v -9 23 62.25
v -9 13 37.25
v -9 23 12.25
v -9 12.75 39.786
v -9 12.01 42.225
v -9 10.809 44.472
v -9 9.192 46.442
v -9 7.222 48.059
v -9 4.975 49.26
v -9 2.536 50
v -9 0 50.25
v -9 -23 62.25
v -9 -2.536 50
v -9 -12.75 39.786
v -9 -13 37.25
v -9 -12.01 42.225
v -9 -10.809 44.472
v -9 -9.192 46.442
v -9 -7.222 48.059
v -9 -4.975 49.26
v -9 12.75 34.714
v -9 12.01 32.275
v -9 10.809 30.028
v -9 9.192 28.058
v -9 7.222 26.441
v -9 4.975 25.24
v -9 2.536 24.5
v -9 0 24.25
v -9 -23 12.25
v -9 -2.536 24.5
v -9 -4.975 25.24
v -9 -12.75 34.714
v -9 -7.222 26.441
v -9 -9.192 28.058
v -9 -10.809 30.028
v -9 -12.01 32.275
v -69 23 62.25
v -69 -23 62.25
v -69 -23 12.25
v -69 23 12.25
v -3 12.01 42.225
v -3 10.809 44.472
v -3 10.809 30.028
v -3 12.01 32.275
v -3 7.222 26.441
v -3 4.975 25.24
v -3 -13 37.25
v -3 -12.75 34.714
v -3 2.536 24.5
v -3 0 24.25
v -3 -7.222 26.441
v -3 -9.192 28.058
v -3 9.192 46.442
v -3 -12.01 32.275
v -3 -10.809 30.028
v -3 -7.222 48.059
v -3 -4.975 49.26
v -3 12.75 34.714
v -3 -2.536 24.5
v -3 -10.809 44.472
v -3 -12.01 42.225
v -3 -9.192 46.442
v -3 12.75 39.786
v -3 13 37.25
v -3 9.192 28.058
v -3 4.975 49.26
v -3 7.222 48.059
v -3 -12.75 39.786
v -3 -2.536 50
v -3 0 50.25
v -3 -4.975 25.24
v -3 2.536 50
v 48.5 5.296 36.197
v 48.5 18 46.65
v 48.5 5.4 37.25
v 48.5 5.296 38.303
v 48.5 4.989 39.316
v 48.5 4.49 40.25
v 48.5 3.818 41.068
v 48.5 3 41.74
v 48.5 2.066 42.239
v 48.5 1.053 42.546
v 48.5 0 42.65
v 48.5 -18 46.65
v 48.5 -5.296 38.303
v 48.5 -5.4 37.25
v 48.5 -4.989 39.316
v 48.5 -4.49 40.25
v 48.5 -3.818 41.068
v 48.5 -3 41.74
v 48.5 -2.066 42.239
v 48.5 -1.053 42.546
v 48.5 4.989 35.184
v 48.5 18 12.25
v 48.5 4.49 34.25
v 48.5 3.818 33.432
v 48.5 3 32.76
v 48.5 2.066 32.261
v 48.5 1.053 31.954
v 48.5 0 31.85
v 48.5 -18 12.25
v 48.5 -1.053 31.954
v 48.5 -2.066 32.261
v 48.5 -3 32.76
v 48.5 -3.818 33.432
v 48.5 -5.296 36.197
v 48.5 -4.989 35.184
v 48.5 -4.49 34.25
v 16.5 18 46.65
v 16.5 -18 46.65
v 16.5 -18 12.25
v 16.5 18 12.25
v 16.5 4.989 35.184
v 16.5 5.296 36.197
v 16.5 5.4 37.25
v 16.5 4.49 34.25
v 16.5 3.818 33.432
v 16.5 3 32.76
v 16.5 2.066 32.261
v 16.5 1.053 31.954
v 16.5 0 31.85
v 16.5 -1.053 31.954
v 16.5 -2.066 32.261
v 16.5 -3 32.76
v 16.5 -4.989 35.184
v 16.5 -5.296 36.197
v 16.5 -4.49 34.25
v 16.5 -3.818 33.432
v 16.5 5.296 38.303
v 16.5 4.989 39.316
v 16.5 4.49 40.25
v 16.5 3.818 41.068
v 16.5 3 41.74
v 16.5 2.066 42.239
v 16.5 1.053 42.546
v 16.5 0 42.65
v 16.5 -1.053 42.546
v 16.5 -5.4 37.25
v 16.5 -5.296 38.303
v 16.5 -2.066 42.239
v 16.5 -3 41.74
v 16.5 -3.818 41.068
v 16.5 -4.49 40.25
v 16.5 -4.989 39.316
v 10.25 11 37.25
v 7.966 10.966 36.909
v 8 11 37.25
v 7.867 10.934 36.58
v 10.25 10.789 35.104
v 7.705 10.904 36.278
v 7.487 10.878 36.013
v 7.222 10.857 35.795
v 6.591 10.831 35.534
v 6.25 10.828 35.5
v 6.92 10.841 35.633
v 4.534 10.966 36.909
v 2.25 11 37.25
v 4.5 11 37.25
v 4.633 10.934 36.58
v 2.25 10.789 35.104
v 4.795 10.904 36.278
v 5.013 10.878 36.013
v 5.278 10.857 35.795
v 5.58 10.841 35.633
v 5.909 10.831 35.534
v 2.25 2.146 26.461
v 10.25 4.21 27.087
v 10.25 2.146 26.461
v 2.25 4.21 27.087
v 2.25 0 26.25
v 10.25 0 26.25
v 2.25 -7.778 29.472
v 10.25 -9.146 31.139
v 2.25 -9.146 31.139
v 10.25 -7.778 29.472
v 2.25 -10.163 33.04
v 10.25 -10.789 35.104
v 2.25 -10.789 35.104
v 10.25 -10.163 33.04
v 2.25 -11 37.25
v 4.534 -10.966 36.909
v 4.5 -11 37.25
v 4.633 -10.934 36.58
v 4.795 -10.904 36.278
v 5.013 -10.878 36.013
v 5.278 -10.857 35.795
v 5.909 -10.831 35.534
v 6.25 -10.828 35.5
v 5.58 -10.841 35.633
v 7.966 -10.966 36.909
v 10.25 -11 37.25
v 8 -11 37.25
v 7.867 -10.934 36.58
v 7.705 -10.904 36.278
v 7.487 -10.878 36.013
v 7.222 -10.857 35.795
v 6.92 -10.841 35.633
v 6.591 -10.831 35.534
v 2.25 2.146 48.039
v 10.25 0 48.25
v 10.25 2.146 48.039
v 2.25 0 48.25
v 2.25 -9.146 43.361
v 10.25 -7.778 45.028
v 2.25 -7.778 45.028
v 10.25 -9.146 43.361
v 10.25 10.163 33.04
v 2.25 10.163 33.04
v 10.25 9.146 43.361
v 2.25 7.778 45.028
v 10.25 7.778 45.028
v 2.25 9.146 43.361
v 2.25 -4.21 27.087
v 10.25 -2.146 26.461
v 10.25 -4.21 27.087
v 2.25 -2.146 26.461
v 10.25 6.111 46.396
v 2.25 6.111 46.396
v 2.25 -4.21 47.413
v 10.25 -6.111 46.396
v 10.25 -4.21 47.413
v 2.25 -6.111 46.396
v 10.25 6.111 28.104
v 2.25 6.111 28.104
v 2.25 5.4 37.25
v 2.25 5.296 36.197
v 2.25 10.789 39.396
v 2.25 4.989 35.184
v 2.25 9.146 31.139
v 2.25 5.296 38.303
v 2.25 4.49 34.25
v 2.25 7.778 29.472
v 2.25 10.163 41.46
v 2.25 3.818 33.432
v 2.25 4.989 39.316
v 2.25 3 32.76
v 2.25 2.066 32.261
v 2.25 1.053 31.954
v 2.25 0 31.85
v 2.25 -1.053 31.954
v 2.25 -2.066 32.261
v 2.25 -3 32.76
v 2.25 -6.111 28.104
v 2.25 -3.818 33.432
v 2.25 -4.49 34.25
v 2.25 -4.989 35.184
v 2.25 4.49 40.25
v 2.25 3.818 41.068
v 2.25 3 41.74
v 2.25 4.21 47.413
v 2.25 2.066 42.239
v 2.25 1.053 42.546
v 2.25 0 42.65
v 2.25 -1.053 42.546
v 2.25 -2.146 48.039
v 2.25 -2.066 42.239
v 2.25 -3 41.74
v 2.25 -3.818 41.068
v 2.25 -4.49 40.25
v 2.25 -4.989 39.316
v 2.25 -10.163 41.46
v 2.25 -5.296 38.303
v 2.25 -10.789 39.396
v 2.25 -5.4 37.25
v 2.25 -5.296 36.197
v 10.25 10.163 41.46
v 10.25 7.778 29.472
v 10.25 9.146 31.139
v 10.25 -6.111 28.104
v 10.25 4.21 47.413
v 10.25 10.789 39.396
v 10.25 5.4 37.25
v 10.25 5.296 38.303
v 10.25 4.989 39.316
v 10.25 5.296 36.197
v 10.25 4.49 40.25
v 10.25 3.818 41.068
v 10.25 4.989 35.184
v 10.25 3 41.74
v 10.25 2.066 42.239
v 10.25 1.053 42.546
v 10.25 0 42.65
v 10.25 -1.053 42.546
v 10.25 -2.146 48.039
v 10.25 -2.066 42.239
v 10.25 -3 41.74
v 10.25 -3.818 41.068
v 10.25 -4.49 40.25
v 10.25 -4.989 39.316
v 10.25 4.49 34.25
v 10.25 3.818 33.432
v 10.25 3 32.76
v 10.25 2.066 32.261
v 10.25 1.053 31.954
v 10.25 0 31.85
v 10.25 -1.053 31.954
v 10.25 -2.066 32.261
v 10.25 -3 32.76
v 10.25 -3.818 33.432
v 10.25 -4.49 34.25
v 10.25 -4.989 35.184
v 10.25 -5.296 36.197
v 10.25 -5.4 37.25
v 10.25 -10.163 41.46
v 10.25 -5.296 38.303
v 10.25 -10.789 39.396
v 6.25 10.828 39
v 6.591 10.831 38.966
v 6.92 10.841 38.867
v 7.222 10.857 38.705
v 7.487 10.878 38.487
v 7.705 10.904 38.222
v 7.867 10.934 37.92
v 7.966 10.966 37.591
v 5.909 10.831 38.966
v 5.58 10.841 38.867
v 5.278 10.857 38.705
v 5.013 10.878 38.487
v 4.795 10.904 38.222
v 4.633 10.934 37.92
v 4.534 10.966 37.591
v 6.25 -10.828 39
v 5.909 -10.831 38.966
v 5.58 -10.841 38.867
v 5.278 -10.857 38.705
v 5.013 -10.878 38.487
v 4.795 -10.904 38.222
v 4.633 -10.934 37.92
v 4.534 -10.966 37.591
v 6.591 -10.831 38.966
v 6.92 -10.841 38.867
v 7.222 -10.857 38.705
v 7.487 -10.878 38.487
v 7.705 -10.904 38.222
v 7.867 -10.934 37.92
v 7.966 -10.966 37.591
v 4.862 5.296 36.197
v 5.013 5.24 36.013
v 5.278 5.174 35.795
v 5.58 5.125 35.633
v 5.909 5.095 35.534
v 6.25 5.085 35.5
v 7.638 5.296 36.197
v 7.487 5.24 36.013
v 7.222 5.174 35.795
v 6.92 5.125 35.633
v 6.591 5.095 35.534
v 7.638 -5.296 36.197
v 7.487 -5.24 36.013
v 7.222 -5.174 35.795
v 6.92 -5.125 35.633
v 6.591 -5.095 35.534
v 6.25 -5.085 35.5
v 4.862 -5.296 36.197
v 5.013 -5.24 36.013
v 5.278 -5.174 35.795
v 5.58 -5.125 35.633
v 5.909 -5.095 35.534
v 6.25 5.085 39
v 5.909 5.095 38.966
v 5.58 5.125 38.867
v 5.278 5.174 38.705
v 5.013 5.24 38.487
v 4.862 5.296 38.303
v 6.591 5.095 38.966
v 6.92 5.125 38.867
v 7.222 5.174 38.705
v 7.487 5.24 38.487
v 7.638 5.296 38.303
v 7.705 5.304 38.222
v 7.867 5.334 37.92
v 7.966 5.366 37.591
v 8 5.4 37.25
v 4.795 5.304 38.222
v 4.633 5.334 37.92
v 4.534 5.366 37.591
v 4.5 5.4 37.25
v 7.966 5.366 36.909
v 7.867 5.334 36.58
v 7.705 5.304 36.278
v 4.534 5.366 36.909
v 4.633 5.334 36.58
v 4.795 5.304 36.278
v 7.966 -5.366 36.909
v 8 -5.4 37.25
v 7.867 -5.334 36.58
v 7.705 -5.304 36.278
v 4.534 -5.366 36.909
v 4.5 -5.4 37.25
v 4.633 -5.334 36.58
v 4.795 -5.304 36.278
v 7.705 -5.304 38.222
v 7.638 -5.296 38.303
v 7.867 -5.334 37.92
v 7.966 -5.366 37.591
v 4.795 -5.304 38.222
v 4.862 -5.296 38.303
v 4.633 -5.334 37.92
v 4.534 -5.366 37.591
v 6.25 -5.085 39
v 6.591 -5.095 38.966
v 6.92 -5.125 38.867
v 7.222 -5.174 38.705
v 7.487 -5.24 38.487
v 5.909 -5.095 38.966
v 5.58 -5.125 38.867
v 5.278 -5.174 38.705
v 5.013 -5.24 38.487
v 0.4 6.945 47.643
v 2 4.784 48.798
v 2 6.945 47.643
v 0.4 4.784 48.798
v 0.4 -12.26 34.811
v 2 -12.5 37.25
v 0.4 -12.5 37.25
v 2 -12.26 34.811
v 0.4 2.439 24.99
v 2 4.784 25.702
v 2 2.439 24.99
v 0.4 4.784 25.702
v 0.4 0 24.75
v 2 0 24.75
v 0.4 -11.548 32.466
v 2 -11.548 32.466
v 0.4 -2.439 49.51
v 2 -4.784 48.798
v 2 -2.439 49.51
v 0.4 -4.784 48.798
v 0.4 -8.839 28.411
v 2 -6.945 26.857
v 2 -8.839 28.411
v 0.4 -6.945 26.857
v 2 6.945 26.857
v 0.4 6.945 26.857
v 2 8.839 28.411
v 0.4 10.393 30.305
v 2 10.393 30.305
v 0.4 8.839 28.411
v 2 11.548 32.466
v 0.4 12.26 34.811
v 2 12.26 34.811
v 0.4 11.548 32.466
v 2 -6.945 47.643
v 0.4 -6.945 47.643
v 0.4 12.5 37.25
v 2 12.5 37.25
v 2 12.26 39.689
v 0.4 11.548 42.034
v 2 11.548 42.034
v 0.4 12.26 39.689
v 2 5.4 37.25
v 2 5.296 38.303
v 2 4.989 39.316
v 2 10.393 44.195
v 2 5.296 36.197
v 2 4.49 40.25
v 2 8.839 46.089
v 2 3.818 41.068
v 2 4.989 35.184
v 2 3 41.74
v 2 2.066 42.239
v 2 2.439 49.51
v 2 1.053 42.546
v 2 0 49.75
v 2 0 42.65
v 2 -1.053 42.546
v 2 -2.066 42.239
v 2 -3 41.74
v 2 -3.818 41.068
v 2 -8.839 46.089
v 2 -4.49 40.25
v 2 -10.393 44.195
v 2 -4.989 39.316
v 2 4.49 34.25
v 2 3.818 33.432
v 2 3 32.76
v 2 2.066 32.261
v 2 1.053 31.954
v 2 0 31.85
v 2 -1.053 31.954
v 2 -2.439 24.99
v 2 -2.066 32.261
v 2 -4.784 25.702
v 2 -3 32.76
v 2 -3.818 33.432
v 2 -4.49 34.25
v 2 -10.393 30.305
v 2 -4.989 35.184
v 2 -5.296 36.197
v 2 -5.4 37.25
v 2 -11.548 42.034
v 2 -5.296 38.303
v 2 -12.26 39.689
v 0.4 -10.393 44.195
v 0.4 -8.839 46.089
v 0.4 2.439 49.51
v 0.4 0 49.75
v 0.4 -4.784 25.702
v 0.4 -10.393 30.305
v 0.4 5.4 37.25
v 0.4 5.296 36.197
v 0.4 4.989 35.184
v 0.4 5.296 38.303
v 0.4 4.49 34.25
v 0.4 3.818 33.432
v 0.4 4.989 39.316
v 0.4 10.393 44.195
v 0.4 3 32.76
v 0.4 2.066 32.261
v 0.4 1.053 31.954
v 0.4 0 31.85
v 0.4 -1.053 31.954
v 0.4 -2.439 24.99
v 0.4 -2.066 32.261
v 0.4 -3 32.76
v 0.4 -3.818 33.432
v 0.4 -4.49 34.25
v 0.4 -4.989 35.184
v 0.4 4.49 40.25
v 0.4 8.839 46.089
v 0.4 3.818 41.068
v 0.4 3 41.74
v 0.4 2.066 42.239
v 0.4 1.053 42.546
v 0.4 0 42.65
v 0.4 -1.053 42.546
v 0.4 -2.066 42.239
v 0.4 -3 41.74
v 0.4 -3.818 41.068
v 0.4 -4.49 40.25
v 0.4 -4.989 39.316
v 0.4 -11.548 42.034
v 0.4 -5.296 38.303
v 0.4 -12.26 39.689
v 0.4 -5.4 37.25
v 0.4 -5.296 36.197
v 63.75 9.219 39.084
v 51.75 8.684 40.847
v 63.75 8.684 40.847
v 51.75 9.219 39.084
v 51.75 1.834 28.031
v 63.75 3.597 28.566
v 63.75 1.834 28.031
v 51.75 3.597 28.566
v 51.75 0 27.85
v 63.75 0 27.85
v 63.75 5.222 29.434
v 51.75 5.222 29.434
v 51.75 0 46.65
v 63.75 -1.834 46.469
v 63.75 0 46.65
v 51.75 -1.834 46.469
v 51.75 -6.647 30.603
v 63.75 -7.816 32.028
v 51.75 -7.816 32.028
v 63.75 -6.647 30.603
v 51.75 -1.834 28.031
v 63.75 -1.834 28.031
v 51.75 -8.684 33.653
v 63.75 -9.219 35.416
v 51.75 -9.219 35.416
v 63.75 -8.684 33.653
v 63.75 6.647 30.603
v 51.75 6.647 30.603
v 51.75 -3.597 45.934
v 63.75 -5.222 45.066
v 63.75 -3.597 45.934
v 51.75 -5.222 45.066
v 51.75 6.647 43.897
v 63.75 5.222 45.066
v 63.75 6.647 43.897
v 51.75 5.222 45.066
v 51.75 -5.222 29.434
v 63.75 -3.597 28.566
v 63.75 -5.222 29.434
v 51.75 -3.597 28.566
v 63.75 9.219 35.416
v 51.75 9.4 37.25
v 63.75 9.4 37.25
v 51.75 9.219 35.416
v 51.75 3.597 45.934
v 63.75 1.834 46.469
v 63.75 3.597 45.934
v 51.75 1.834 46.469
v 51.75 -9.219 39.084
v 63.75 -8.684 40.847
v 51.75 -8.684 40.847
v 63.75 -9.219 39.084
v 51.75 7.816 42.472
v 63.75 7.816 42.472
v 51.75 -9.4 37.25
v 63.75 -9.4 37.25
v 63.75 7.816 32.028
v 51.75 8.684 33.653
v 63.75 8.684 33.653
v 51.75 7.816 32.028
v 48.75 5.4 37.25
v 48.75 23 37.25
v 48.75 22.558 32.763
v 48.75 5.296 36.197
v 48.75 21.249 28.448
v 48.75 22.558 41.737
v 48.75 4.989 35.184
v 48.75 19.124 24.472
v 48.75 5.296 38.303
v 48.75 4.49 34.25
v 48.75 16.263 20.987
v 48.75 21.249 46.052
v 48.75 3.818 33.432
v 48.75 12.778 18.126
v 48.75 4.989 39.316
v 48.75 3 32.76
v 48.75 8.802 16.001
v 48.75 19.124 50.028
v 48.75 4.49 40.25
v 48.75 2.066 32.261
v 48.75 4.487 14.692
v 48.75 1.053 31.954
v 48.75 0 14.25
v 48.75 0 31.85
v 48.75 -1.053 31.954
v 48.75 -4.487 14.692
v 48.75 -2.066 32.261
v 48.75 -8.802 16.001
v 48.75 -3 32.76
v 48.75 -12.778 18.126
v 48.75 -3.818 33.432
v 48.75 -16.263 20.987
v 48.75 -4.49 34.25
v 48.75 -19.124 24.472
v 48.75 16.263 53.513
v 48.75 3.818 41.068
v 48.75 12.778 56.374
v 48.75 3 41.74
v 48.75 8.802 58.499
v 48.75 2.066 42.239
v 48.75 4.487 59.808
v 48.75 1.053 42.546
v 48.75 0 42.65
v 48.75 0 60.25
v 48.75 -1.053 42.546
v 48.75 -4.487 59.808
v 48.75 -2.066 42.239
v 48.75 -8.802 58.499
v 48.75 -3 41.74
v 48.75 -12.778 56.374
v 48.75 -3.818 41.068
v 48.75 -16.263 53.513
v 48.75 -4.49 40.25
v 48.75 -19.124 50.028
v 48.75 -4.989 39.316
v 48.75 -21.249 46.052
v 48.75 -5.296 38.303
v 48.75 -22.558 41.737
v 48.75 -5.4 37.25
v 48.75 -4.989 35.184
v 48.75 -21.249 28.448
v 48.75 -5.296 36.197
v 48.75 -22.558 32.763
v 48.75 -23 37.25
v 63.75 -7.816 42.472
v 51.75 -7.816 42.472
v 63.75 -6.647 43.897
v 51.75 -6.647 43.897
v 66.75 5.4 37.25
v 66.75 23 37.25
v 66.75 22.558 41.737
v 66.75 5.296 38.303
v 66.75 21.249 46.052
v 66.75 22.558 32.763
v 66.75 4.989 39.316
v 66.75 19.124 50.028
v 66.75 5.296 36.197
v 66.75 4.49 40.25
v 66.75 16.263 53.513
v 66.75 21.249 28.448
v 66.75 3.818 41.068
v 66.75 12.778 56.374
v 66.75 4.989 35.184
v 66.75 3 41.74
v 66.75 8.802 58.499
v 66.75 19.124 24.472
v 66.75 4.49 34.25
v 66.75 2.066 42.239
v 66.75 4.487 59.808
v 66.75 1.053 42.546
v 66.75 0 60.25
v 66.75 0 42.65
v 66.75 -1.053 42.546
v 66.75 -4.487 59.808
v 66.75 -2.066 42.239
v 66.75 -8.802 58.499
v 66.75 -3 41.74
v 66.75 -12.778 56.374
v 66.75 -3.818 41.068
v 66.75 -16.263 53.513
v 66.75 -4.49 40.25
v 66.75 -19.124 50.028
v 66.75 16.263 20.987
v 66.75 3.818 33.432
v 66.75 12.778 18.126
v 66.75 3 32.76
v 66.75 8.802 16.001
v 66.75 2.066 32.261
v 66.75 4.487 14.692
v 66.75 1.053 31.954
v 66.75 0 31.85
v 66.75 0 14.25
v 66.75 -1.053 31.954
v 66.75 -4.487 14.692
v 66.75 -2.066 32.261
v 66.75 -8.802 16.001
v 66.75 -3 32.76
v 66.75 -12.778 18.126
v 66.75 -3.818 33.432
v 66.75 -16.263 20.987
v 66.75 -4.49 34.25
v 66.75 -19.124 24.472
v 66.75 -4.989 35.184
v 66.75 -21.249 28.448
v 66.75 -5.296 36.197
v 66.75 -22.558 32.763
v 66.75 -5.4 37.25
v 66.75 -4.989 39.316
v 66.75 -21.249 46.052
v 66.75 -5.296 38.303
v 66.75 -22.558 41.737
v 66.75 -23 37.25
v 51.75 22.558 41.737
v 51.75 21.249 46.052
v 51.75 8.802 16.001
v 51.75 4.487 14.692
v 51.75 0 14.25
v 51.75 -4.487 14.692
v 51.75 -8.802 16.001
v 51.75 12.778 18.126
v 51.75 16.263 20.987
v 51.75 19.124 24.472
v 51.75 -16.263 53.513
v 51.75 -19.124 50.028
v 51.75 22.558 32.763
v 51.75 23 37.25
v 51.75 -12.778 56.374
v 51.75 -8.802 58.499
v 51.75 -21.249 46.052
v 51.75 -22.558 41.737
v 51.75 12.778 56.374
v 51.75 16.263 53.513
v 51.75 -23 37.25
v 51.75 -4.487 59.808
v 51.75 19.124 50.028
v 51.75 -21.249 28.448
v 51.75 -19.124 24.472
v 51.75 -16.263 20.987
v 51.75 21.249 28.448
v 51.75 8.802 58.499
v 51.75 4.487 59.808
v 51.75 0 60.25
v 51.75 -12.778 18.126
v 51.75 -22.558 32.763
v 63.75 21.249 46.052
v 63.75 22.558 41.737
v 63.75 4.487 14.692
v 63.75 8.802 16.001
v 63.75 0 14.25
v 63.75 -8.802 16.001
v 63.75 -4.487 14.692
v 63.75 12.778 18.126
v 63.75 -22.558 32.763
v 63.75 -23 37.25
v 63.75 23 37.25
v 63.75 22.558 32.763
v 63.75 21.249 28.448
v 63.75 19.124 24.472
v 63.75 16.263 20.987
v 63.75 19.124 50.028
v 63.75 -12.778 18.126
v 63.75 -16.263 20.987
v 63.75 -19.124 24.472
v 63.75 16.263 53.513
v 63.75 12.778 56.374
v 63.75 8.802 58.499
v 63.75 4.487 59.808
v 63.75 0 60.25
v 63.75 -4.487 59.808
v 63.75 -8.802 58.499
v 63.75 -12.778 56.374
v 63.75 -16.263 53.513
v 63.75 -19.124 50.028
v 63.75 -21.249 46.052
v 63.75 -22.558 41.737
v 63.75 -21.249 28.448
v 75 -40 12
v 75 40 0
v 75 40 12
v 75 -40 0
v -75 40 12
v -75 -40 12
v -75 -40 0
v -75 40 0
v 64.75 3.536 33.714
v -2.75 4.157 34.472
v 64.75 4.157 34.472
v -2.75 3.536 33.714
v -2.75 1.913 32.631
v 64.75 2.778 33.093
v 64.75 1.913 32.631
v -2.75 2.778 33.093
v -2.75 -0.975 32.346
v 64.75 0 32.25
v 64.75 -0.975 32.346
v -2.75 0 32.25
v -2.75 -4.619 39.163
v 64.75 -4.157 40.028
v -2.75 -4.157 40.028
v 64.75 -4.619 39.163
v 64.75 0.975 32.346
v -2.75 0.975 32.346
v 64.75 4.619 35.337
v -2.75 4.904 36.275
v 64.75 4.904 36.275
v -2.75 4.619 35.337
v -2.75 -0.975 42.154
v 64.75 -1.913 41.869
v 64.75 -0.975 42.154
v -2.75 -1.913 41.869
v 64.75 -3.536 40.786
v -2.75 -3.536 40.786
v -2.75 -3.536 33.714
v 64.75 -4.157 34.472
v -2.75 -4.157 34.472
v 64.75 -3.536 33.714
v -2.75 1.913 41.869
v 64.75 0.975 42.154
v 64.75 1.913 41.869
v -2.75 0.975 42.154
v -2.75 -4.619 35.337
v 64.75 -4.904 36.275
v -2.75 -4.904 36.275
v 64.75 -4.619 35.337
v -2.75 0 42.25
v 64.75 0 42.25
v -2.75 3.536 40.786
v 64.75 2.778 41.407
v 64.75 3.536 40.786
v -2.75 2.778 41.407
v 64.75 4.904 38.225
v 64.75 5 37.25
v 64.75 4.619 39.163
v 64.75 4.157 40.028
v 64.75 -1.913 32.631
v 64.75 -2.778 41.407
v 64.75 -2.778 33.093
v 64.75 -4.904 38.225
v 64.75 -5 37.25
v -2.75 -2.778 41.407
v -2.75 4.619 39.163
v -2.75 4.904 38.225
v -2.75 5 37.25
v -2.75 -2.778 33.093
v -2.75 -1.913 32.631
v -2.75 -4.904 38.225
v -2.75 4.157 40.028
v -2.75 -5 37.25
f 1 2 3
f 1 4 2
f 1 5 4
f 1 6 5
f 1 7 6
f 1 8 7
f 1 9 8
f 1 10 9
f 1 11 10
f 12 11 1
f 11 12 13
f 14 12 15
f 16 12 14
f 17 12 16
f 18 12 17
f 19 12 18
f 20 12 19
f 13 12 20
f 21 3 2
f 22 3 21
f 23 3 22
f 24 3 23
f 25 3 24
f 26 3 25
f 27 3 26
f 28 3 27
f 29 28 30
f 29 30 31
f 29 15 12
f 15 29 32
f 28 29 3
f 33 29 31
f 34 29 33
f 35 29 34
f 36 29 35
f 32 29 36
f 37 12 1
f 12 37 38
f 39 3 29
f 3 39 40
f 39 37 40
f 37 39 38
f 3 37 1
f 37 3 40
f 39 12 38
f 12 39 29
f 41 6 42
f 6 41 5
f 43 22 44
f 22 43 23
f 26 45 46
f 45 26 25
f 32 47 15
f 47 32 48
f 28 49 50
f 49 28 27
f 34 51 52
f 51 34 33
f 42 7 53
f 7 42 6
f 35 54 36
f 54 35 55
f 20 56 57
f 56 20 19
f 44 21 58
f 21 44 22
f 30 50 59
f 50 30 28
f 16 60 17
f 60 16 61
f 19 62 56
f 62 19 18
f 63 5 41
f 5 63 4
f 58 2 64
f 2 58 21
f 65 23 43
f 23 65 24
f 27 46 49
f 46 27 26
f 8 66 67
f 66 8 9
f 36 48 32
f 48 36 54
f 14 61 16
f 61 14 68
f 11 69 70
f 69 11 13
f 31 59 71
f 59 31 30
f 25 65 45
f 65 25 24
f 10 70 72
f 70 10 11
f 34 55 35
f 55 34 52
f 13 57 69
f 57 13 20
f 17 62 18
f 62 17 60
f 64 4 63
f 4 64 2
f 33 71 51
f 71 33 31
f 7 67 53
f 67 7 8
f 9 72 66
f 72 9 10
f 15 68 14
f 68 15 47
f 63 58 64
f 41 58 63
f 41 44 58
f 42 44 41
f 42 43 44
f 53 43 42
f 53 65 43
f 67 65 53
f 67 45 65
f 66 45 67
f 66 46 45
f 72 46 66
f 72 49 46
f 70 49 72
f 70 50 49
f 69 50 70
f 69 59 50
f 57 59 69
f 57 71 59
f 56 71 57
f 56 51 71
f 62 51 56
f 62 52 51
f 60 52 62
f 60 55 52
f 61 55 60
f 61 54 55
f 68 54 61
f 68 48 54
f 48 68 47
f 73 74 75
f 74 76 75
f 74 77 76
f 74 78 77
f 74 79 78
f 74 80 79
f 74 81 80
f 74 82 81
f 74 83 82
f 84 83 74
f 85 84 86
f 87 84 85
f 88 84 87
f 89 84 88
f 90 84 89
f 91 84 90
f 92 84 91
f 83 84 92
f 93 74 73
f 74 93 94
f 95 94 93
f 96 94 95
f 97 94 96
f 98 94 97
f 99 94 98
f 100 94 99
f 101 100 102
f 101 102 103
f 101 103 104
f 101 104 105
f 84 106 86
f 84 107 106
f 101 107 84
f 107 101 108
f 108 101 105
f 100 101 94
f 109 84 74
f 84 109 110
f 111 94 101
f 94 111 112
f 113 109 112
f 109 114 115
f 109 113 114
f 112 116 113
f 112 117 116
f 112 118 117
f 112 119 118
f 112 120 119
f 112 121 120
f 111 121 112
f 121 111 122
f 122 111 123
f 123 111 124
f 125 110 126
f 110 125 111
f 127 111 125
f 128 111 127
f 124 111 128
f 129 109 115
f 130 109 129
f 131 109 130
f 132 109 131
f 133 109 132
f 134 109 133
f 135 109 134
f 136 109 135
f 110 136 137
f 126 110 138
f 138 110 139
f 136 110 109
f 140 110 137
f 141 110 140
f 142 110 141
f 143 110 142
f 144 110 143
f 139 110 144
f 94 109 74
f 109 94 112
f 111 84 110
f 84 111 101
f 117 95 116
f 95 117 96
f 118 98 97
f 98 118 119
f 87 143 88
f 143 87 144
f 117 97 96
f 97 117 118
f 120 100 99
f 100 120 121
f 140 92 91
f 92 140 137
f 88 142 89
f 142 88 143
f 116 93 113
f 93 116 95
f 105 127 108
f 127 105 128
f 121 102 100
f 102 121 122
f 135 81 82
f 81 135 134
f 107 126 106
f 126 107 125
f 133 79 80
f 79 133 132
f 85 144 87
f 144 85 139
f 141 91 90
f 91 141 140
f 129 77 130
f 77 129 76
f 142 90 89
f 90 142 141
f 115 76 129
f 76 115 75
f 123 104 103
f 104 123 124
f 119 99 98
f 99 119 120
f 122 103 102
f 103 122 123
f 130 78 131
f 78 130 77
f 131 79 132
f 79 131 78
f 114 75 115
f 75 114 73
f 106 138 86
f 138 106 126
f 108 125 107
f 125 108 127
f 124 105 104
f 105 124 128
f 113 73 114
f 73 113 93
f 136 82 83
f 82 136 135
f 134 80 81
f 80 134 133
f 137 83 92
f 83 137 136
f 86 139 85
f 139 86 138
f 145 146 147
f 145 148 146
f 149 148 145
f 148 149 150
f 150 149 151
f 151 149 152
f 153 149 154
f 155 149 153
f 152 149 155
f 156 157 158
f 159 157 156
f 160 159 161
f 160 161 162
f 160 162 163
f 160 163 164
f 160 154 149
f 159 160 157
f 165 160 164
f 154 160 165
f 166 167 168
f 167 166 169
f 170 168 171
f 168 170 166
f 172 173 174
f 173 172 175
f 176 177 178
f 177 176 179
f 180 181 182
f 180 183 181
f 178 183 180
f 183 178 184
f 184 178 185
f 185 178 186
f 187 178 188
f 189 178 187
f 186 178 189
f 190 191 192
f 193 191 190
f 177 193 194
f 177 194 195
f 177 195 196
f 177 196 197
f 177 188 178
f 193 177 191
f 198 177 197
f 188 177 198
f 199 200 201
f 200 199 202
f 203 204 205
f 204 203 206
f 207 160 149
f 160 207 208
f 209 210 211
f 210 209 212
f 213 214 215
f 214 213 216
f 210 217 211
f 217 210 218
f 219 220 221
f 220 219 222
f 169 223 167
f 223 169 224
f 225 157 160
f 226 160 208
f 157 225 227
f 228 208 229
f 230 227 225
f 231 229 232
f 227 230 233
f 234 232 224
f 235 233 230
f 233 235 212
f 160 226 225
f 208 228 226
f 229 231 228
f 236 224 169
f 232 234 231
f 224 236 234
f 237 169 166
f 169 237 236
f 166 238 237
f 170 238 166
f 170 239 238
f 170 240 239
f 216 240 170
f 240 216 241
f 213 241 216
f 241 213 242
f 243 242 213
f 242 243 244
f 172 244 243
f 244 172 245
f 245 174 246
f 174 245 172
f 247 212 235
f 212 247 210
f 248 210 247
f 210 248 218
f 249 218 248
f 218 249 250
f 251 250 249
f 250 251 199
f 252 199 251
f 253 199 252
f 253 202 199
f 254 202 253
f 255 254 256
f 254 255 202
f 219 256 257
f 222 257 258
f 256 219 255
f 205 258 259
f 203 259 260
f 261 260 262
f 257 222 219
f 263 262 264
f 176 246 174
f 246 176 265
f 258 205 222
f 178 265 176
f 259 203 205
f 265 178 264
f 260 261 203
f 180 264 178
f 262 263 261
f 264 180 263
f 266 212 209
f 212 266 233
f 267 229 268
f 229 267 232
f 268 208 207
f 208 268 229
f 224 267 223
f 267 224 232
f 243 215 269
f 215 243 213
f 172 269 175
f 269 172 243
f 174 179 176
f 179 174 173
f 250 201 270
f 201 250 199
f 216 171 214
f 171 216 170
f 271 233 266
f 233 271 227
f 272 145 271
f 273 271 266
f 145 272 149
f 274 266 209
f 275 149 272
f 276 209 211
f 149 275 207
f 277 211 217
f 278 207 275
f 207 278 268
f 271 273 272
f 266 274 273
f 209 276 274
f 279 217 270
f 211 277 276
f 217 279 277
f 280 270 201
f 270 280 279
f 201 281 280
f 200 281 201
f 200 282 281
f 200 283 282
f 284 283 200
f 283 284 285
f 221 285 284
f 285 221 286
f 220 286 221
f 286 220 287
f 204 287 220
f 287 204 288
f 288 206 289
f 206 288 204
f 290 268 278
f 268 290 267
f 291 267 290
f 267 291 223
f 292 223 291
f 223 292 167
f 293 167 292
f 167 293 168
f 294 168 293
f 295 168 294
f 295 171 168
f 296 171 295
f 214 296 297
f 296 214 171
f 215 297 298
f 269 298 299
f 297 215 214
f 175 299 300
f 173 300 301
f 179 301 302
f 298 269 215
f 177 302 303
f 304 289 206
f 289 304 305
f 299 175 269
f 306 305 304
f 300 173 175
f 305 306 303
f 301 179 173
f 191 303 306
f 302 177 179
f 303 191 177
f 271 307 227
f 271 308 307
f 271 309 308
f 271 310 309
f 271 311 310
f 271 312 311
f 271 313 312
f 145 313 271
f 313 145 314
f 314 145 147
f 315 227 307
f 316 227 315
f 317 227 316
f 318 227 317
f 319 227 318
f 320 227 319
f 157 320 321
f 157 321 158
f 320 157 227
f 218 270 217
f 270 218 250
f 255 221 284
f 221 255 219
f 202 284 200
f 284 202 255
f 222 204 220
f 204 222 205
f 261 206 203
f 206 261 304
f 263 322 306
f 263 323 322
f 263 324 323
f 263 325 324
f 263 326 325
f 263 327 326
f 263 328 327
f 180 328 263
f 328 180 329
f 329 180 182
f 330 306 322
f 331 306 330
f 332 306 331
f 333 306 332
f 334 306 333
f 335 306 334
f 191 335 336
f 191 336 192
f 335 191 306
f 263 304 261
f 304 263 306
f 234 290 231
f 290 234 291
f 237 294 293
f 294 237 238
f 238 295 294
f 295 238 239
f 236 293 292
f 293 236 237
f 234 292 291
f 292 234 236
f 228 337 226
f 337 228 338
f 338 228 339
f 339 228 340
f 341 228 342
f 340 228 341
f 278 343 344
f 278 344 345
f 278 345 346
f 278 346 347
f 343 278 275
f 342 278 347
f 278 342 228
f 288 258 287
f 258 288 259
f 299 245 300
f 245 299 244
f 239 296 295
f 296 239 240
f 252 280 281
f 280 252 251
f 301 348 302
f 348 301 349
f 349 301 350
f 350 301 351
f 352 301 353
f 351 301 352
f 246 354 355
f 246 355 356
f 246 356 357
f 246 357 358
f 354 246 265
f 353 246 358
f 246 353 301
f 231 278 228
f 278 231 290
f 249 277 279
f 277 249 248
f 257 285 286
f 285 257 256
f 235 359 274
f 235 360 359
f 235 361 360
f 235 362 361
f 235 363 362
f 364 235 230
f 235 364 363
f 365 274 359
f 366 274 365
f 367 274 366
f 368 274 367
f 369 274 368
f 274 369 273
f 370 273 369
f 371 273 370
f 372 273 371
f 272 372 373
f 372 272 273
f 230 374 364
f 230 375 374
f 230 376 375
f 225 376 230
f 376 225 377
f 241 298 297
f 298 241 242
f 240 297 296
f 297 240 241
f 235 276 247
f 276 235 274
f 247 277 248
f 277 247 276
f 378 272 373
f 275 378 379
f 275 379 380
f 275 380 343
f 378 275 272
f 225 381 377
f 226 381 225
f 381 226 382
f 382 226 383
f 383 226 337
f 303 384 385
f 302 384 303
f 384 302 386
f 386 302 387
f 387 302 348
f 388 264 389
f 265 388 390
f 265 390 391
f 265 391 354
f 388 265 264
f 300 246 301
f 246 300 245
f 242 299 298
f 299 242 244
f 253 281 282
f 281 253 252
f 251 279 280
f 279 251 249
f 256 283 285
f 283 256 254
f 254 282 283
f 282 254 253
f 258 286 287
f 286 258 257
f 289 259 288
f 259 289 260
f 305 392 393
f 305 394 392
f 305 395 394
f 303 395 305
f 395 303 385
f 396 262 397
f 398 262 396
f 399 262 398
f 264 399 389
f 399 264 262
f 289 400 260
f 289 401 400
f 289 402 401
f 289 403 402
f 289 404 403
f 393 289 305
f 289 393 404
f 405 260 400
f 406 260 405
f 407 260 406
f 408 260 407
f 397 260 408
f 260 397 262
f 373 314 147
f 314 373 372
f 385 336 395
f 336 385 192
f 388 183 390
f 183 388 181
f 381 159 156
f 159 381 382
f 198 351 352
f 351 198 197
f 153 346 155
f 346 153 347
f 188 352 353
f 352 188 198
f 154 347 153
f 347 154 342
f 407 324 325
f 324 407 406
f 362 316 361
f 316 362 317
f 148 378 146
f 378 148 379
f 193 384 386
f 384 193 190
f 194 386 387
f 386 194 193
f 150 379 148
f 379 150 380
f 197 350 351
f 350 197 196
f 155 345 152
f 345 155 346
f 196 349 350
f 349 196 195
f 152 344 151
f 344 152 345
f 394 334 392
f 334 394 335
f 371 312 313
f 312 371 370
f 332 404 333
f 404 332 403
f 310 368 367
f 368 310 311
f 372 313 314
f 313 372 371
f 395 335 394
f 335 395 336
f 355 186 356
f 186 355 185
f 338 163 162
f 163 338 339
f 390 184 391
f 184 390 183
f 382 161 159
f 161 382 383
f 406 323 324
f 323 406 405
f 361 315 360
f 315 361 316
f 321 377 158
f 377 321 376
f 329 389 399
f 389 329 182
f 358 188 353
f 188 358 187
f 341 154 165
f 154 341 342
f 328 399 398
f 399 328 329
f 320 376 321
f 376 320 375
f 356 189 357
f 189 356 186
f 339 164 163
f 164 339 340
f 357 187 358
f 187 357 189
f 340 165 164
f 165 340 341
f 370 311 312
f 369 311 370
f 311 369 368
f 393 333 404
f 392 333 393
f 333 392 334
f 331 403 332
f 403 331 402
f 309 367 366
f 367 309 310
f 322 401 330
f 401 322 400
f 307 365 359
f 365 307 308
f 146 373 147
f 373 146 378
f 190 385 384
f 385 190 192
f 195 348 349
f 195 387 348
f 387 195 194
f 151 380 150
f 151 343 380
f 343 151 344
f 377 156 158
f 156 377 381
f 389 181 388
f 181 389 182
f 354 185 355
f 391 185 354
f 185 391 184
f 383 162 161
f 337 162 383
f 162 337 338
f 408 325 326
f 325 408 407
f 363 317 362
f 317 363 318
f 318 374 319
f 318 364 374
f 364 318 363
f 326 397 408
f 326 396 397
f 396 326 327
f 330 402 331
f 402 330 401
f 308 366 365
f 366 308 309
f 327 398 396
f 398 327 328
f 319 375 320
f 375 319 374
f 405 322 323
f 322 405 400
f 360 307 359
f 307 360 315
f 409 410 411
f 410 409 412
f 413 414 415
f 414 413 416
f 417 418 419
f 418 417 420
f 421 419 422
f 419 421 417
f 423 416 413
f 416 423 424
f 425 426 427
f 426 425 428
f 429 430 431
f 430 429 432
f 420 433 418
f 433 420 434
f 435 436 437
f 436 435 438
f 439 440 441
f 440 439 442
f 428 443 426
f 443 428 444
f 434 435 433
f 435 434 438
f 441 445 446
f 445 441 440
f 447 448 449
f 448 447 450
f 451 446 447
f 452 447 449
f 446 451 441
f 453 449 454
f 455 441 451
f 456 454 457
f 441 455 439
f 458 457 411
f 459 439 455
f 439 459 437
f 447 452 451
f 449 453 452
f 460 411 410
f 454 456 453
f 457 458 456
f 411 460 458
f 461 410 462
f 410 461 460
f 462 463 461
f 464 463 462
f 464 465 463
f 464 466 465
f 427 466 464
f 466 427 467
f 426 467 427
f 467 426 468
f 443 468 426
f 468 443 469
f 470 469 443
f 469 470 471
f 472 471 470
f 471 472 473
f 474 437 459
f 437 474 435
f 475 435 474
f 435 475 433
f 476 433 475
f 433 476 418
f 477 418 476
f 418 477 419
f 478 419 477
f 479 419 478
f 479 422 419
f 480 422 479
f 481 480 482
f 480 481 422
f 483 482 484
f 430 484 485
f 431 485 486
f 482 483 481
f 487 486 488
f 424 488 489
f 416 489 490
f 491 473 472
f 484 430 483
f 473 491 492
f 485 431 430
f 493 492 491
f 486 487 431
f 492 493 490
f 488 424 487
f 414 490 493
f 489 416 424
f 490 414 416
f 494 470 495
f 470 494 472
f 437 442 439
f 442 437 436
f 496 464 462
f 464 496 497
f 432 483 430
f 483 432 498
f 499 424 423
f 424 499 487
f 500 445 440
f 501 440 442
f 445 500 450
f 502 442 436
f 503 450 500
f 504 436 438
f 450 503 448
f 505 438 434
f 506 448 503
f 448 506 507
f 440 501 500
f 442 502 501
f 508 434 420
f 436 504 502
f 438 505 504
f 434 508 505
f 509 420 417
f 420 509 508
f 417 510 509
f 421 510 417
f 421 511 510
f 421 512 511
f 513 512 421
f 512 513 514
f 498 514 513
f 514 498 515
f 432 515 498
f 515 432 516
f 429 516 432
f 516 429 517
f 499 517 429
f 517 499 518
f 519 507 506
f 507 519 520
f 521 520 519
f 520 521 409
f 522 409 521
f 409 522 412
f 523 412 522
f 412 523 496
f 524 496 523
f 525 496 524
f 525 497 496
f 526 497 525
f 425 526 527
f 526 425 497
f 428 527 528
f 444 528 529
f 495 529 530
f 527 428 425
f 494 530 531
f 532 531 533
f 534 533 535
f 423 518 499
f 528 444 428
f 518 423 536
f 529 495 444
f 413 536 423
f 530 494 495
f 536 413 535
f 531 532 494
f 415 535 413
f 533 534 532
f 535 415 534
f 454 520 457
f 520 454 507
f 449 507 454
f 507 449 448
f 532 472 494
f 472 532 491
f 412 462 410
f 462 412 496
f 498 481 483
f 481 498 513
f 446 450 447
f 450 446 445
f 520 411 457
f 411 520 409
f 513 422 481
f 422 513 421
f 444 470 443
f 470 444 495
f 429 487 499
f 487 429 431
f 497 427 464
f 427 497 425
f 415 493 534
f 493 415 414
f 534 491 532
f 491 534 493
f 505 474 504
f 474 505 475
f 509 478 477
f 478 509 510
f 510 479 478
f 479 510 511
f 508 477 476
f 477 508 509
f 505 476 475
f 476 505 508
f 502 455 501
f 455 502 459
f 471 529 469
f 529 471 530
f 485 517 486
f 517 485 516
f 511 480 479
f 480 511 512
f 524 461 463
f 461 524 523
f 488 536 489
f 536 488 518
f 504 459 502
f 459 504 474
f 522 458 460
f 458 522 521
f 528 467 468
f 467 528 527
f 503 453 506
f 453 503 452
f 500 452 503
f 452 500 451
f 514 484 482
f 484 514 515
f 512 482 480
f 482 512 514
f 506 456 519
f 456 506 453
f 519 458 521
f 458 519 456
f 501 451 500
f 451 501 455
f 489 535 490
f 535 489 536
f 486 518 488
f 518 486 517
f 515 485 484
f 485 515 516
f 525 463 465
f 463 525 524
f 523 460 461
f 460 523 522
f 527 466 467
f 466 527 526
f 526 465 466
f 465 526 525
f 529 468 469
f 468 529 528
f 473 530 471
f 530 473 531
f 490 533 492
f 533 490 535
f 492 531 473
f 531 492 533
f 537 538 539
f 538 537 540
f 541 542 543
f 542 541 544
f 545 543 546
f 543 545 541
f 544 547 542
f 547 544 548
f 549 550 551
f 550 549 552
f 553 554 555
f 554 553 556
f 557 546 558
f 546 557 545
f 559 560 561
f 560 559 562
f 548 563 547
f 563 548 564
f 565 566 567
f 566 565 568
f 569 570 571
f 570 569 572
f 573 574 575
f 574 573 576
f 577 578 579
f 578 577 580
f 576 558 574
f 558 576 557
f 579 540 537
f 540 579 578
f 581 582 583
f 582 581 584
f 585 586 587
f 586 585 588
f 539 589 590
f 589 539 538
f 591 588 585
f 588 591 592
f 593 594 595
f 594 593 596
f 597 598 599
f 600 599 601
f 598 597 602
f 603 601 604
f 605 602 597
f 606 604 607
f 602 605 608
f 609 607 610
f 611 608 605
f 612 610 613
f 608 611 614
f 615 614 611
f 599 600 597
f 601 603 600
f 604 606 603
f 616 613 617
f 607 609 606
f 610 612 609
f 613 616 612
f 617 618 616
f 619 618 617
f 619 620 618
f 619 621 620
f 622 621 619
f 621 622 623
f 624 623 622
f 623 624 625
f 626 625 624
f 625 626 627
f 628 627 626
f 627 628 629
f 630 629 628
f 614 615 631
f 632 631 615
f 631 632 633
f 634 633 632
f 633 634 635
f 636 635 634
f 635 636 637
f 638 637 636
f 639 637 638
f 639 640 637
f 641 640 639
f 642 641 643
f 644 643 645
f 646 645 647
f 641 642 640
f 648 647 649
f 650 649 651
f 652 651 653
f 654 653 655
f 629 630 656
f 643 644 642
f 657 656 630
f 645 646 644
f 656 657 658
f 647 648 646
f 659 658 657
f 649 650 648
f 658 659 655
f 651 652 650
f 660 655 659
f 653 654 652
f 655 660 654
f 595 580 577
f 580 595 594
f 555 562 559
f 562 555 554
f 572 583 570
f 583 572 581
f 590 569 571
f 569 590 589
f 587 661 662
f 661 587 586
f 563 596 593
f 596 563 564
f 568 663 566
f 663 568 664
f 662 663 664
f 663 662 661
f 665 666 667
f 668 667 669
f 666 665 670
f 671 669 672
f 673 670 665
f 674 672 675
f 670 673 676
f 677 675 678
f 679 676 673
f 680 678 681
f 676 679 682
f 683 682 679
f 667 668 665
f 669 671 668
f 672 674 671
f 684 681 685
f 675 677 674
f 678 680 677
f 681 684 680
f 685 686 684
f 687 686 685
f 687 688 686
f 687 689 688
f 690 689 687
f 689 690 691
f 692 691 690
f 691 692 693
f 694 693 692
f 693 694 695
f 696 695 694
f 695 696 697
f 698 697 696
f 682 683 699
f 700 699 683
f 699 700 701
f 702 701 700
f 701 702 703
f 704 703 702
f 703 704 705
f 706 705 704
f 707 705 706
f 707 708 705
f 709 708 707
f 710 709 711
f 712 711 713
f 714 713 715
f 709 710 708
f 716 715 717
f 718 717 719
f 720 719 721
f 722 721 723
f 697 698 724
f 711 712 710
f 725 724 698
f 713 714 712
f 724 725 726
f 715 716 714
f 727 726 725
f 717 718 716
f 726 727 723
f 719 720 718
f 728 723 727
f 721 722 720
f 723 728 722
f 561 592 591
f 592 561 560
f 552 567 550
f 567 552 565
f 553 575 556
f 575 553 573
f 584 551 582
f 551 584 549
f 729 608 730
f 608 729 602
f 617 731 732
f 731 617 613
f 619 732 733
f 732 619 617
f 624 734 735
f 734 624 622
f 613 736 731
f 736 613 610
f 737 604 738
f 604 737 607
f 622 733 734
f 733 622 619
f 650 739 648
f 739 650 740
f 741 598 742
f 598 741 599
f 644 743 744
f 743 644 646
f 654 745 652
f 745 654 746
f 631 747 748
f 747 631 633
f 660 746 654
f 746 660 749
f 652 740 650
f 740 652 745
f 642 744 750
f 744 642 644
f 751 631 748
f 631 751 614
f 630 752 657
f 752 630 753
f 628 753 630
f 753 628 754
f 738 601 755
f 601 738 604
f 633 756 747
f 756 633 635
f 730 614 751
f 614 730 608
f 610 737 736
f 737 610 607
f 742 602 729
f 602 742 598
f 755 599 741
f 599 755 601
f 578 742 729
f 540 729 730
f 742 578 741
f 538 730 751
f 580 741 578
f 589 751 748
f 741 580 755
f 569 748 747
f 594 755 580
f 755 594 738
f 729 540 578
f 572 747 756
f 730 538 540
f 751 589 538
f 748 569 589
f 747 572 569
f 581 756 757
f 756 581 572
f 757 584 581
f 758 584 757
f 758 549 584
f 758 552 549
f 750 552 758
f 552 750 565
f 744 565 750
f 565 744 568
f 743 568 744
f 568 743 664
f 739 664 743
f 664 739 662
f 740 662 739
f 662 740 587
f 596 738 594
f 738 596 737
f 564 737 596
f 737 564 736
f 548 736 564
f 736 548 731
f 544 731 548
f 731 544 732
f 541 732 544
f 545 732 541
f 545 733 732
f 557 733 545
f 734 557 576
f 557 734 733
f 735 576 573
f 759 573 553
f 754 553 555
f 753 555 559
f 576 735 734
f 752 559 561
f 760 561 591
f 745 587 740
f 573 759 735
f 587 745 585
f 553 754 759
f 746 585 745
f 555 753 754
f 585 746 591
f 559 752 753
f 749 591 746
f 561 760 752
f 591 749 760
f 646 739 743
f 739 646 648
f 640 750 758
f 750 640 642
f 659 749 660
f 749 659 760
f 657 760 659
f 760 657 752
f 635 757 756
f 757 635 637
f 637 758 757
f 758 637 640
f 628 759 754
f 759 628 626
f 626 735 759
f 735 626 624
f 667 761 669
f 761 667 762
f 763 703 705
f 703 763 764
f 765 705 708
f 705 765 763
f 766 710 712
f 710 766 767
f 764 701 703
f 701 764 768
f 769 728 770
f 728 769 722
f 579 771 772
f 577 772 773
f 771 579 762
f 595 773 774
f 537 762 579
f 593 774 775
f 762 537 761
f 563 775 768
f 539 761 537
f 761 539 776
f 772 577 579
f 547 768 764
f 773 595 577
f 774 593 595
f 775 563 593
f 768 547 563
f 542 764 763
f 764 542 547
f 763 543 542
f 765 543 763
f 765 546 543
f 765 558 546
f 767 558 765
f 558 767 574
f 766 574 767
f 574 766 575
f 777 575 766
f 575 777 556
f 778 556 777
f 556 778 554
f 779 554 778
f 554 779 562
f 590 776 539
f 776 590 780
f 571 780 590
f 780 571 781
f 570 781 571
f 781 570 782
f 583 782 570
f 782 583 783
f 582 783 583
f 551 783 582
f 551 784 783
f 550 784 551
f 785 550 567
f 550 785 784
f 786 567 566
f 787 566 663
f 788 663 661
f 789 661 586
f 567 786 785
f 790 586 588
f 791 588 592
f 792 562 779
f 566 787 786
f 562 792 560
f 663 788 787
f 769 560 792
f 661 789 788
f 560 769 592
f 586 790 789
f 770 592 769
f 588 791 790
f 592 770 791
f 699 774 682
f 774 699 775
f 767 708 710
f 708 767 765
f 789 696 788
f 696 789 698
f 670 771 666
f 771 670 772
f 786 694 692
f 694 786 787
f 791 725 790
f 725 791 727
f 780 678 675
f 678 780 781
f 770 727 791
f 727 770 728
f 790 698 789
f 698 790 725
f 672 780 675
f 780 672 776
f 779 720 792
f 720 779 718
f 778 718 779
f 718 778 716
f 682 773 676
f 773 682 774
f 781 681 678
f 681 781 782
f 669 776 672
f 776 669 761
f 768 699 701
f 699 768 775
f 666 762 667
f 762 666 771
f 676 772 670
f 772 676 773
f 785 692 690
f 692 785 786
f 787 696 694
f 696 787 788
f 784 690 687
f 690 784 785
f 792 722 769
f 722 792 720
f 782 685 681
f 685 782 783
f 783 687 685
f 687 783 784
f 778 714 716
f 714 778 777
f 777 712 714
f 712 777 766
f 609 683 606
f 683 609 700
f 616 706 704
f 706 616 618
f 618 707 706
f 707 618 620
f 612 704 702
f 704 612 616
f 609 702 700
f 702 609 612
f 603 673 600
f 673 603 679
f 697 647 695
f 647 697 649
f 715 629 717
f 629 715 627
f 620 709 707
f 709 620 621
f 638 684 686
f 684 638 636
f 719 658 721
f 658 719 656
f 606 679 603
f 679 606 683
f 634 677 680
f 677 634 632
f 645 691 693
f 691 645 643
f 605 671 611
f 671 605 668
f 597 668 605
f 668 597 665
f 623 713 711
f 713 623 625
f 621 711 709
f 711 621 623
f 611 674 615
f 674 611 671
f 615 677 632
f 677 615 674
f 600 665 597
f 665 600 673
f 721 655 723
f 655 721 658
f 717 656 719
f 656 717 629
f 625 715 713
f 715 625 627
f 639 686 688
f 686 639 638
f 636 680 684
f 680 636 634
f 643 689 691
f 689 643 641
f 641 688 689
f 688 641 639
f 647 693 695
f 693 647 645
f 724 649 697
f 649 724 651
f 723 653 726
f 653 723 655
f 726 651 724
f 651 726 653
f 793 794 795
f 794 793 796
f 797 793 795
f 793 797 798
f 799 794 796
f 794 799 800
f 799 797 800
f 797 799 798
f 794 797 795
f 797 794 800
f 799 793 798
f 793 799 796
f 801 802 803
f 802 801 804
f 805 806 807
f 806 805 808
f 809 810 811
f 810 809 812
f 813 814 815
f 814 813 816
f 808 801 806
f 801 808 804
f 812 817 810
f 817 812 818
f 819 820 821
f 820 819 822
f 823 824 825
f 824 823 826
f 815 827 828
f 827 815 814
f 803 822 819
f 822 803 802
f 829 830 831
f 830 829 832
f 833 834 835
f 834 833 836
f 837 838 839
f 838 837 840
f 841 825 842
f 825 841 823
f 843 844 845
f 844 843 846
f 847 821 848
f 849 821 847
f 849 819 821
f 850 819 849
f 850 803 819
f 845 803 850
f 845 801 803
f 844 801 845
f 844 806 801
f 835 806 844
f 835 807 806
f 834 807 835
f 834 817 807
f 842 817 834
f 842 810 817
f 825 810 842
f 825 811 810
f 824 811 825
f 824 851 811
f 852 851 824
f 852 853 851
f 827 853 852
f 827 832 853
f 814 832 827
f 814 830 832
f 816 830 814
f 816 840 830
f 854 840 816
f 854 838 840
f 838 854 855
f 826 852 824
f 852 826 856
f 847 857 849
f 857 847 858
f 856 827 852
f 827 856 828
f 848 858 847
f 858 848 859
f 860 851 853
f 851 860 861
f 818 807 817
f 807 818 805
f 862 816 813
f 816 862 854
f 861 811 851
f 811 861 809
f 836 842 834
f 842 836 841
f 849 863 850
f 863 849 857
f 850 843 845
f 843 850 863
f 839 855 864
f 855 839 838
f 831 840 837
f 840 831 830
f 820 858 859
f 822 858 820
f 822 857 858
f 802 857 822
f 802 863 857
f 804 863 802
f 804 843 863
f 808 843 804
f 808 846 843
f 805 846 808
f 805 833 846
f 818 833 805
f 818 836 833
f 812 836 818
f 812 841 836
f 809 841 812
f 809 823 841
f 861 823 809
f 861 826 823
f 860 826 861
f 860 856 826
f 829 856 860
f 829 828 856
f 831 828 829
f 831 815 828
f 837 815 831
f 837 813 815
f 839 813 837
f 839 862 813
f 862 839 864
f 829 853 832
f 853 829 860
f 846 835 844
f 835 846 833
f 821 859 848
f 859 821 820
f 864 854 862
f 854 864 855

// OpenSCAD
$fn = 32;

// ------------------------------------------------------------------------
// Motor drive station: motor 60 x 50 mm, shaft d10, pulley d46
// Every part is its own module, assembly() places every instance.
// ------------------------------------------------------------------------

// --- part 1 ---
module station_bed() {
  difference() {
    translate([-75, -40, 0]) cube([150, 80, 12]);
  }
}

// --- part 2 ---
module drive_motor() {
  union() {
    translate([-30, -23, 0]) cube([60, 46, 50]);
    translate([33, 0, 25]) rotate([0, 90, 0]) cylinder(h = 6, d = 26, center = true);
  }
}

// --- part 3 ---
module pillow_block() {
  difference() {
    translate([-16, -18, 0]) cube([32, 36, 34.4]);
    translate([0, 0, 25]) rotate([0, 90, 0]) cylinder(h = 34, d = 10.8, center = true);
  }
}

// --- part 4 ---
module drive_shaft() {
  translate([0, 0, -33.75]) cylinder(h = 67.5, d = 10);
}

// --- part 5 ---
module shaft_collar() {
  difference() {
    cylinder(h = 8, d = 22);
    translate([0, 0, -1]) cylinder(h = 10, d = 10.8);
    translate([0, 0, 4]) rotate([90, 0, 0]) cylinder(h = 24, d = 3.5, center = true);
  }
}

// --- part 6 ---
module collar_washer() {
  difference() {
      translate([0, 0, 0]) cylinder(h = 1.6, d = 25);
      translate([0, 0, -1]) cylinder(h = 3.6, d = 10.8);
    }
}

// --- part 7 ---
module drive_pulley() {
  difference() {
    union() {
      cylinder(h = 18, d = 18.8);
      cylinder(h = 3, d = 46);
      translate([0, 0, 15]) cylinder(h = 3, d = 46);
    }
    translate([0, 0, -1]) cylinder(h = 20, d = 10.8);
  }
}

// --- assembly ---
module assembly() {
  color([0.80, 0.24, 0.20]) translate([0, 0, 0]) rotate([0, 0, 0]) station_bed();
  color([0.20, 0.45, 0.75]) translate([-39, 0, 12.25]) rotate([0, 0, 0]) drive_motor();
  color([0.25, 0.62, 0.32]) translate([32.5, 0, 12.25]) rotate([0, 0, 0]) pillow_block();
  color([0.92, 0.70, 0.18]) translate([31, 0, 37.25]) rotate([0, 90, 0]) drive_shaft();
  color([0.58, 0.35, 0.70]) translate([2.25, 0, 37.25]) rotate([0, 90, 0]) shaft_collar();
  color([0.16, 0.66, 0.66]) translate([0.4, 0, 37.25]) rotate([0, 90, 0]) collar_washer();
  color([0.85, 0.48, 0.18]) translate([48.75, 0, 37.25]) rotate([0, 90, 0]) drive_pulley();
}

assembly();
